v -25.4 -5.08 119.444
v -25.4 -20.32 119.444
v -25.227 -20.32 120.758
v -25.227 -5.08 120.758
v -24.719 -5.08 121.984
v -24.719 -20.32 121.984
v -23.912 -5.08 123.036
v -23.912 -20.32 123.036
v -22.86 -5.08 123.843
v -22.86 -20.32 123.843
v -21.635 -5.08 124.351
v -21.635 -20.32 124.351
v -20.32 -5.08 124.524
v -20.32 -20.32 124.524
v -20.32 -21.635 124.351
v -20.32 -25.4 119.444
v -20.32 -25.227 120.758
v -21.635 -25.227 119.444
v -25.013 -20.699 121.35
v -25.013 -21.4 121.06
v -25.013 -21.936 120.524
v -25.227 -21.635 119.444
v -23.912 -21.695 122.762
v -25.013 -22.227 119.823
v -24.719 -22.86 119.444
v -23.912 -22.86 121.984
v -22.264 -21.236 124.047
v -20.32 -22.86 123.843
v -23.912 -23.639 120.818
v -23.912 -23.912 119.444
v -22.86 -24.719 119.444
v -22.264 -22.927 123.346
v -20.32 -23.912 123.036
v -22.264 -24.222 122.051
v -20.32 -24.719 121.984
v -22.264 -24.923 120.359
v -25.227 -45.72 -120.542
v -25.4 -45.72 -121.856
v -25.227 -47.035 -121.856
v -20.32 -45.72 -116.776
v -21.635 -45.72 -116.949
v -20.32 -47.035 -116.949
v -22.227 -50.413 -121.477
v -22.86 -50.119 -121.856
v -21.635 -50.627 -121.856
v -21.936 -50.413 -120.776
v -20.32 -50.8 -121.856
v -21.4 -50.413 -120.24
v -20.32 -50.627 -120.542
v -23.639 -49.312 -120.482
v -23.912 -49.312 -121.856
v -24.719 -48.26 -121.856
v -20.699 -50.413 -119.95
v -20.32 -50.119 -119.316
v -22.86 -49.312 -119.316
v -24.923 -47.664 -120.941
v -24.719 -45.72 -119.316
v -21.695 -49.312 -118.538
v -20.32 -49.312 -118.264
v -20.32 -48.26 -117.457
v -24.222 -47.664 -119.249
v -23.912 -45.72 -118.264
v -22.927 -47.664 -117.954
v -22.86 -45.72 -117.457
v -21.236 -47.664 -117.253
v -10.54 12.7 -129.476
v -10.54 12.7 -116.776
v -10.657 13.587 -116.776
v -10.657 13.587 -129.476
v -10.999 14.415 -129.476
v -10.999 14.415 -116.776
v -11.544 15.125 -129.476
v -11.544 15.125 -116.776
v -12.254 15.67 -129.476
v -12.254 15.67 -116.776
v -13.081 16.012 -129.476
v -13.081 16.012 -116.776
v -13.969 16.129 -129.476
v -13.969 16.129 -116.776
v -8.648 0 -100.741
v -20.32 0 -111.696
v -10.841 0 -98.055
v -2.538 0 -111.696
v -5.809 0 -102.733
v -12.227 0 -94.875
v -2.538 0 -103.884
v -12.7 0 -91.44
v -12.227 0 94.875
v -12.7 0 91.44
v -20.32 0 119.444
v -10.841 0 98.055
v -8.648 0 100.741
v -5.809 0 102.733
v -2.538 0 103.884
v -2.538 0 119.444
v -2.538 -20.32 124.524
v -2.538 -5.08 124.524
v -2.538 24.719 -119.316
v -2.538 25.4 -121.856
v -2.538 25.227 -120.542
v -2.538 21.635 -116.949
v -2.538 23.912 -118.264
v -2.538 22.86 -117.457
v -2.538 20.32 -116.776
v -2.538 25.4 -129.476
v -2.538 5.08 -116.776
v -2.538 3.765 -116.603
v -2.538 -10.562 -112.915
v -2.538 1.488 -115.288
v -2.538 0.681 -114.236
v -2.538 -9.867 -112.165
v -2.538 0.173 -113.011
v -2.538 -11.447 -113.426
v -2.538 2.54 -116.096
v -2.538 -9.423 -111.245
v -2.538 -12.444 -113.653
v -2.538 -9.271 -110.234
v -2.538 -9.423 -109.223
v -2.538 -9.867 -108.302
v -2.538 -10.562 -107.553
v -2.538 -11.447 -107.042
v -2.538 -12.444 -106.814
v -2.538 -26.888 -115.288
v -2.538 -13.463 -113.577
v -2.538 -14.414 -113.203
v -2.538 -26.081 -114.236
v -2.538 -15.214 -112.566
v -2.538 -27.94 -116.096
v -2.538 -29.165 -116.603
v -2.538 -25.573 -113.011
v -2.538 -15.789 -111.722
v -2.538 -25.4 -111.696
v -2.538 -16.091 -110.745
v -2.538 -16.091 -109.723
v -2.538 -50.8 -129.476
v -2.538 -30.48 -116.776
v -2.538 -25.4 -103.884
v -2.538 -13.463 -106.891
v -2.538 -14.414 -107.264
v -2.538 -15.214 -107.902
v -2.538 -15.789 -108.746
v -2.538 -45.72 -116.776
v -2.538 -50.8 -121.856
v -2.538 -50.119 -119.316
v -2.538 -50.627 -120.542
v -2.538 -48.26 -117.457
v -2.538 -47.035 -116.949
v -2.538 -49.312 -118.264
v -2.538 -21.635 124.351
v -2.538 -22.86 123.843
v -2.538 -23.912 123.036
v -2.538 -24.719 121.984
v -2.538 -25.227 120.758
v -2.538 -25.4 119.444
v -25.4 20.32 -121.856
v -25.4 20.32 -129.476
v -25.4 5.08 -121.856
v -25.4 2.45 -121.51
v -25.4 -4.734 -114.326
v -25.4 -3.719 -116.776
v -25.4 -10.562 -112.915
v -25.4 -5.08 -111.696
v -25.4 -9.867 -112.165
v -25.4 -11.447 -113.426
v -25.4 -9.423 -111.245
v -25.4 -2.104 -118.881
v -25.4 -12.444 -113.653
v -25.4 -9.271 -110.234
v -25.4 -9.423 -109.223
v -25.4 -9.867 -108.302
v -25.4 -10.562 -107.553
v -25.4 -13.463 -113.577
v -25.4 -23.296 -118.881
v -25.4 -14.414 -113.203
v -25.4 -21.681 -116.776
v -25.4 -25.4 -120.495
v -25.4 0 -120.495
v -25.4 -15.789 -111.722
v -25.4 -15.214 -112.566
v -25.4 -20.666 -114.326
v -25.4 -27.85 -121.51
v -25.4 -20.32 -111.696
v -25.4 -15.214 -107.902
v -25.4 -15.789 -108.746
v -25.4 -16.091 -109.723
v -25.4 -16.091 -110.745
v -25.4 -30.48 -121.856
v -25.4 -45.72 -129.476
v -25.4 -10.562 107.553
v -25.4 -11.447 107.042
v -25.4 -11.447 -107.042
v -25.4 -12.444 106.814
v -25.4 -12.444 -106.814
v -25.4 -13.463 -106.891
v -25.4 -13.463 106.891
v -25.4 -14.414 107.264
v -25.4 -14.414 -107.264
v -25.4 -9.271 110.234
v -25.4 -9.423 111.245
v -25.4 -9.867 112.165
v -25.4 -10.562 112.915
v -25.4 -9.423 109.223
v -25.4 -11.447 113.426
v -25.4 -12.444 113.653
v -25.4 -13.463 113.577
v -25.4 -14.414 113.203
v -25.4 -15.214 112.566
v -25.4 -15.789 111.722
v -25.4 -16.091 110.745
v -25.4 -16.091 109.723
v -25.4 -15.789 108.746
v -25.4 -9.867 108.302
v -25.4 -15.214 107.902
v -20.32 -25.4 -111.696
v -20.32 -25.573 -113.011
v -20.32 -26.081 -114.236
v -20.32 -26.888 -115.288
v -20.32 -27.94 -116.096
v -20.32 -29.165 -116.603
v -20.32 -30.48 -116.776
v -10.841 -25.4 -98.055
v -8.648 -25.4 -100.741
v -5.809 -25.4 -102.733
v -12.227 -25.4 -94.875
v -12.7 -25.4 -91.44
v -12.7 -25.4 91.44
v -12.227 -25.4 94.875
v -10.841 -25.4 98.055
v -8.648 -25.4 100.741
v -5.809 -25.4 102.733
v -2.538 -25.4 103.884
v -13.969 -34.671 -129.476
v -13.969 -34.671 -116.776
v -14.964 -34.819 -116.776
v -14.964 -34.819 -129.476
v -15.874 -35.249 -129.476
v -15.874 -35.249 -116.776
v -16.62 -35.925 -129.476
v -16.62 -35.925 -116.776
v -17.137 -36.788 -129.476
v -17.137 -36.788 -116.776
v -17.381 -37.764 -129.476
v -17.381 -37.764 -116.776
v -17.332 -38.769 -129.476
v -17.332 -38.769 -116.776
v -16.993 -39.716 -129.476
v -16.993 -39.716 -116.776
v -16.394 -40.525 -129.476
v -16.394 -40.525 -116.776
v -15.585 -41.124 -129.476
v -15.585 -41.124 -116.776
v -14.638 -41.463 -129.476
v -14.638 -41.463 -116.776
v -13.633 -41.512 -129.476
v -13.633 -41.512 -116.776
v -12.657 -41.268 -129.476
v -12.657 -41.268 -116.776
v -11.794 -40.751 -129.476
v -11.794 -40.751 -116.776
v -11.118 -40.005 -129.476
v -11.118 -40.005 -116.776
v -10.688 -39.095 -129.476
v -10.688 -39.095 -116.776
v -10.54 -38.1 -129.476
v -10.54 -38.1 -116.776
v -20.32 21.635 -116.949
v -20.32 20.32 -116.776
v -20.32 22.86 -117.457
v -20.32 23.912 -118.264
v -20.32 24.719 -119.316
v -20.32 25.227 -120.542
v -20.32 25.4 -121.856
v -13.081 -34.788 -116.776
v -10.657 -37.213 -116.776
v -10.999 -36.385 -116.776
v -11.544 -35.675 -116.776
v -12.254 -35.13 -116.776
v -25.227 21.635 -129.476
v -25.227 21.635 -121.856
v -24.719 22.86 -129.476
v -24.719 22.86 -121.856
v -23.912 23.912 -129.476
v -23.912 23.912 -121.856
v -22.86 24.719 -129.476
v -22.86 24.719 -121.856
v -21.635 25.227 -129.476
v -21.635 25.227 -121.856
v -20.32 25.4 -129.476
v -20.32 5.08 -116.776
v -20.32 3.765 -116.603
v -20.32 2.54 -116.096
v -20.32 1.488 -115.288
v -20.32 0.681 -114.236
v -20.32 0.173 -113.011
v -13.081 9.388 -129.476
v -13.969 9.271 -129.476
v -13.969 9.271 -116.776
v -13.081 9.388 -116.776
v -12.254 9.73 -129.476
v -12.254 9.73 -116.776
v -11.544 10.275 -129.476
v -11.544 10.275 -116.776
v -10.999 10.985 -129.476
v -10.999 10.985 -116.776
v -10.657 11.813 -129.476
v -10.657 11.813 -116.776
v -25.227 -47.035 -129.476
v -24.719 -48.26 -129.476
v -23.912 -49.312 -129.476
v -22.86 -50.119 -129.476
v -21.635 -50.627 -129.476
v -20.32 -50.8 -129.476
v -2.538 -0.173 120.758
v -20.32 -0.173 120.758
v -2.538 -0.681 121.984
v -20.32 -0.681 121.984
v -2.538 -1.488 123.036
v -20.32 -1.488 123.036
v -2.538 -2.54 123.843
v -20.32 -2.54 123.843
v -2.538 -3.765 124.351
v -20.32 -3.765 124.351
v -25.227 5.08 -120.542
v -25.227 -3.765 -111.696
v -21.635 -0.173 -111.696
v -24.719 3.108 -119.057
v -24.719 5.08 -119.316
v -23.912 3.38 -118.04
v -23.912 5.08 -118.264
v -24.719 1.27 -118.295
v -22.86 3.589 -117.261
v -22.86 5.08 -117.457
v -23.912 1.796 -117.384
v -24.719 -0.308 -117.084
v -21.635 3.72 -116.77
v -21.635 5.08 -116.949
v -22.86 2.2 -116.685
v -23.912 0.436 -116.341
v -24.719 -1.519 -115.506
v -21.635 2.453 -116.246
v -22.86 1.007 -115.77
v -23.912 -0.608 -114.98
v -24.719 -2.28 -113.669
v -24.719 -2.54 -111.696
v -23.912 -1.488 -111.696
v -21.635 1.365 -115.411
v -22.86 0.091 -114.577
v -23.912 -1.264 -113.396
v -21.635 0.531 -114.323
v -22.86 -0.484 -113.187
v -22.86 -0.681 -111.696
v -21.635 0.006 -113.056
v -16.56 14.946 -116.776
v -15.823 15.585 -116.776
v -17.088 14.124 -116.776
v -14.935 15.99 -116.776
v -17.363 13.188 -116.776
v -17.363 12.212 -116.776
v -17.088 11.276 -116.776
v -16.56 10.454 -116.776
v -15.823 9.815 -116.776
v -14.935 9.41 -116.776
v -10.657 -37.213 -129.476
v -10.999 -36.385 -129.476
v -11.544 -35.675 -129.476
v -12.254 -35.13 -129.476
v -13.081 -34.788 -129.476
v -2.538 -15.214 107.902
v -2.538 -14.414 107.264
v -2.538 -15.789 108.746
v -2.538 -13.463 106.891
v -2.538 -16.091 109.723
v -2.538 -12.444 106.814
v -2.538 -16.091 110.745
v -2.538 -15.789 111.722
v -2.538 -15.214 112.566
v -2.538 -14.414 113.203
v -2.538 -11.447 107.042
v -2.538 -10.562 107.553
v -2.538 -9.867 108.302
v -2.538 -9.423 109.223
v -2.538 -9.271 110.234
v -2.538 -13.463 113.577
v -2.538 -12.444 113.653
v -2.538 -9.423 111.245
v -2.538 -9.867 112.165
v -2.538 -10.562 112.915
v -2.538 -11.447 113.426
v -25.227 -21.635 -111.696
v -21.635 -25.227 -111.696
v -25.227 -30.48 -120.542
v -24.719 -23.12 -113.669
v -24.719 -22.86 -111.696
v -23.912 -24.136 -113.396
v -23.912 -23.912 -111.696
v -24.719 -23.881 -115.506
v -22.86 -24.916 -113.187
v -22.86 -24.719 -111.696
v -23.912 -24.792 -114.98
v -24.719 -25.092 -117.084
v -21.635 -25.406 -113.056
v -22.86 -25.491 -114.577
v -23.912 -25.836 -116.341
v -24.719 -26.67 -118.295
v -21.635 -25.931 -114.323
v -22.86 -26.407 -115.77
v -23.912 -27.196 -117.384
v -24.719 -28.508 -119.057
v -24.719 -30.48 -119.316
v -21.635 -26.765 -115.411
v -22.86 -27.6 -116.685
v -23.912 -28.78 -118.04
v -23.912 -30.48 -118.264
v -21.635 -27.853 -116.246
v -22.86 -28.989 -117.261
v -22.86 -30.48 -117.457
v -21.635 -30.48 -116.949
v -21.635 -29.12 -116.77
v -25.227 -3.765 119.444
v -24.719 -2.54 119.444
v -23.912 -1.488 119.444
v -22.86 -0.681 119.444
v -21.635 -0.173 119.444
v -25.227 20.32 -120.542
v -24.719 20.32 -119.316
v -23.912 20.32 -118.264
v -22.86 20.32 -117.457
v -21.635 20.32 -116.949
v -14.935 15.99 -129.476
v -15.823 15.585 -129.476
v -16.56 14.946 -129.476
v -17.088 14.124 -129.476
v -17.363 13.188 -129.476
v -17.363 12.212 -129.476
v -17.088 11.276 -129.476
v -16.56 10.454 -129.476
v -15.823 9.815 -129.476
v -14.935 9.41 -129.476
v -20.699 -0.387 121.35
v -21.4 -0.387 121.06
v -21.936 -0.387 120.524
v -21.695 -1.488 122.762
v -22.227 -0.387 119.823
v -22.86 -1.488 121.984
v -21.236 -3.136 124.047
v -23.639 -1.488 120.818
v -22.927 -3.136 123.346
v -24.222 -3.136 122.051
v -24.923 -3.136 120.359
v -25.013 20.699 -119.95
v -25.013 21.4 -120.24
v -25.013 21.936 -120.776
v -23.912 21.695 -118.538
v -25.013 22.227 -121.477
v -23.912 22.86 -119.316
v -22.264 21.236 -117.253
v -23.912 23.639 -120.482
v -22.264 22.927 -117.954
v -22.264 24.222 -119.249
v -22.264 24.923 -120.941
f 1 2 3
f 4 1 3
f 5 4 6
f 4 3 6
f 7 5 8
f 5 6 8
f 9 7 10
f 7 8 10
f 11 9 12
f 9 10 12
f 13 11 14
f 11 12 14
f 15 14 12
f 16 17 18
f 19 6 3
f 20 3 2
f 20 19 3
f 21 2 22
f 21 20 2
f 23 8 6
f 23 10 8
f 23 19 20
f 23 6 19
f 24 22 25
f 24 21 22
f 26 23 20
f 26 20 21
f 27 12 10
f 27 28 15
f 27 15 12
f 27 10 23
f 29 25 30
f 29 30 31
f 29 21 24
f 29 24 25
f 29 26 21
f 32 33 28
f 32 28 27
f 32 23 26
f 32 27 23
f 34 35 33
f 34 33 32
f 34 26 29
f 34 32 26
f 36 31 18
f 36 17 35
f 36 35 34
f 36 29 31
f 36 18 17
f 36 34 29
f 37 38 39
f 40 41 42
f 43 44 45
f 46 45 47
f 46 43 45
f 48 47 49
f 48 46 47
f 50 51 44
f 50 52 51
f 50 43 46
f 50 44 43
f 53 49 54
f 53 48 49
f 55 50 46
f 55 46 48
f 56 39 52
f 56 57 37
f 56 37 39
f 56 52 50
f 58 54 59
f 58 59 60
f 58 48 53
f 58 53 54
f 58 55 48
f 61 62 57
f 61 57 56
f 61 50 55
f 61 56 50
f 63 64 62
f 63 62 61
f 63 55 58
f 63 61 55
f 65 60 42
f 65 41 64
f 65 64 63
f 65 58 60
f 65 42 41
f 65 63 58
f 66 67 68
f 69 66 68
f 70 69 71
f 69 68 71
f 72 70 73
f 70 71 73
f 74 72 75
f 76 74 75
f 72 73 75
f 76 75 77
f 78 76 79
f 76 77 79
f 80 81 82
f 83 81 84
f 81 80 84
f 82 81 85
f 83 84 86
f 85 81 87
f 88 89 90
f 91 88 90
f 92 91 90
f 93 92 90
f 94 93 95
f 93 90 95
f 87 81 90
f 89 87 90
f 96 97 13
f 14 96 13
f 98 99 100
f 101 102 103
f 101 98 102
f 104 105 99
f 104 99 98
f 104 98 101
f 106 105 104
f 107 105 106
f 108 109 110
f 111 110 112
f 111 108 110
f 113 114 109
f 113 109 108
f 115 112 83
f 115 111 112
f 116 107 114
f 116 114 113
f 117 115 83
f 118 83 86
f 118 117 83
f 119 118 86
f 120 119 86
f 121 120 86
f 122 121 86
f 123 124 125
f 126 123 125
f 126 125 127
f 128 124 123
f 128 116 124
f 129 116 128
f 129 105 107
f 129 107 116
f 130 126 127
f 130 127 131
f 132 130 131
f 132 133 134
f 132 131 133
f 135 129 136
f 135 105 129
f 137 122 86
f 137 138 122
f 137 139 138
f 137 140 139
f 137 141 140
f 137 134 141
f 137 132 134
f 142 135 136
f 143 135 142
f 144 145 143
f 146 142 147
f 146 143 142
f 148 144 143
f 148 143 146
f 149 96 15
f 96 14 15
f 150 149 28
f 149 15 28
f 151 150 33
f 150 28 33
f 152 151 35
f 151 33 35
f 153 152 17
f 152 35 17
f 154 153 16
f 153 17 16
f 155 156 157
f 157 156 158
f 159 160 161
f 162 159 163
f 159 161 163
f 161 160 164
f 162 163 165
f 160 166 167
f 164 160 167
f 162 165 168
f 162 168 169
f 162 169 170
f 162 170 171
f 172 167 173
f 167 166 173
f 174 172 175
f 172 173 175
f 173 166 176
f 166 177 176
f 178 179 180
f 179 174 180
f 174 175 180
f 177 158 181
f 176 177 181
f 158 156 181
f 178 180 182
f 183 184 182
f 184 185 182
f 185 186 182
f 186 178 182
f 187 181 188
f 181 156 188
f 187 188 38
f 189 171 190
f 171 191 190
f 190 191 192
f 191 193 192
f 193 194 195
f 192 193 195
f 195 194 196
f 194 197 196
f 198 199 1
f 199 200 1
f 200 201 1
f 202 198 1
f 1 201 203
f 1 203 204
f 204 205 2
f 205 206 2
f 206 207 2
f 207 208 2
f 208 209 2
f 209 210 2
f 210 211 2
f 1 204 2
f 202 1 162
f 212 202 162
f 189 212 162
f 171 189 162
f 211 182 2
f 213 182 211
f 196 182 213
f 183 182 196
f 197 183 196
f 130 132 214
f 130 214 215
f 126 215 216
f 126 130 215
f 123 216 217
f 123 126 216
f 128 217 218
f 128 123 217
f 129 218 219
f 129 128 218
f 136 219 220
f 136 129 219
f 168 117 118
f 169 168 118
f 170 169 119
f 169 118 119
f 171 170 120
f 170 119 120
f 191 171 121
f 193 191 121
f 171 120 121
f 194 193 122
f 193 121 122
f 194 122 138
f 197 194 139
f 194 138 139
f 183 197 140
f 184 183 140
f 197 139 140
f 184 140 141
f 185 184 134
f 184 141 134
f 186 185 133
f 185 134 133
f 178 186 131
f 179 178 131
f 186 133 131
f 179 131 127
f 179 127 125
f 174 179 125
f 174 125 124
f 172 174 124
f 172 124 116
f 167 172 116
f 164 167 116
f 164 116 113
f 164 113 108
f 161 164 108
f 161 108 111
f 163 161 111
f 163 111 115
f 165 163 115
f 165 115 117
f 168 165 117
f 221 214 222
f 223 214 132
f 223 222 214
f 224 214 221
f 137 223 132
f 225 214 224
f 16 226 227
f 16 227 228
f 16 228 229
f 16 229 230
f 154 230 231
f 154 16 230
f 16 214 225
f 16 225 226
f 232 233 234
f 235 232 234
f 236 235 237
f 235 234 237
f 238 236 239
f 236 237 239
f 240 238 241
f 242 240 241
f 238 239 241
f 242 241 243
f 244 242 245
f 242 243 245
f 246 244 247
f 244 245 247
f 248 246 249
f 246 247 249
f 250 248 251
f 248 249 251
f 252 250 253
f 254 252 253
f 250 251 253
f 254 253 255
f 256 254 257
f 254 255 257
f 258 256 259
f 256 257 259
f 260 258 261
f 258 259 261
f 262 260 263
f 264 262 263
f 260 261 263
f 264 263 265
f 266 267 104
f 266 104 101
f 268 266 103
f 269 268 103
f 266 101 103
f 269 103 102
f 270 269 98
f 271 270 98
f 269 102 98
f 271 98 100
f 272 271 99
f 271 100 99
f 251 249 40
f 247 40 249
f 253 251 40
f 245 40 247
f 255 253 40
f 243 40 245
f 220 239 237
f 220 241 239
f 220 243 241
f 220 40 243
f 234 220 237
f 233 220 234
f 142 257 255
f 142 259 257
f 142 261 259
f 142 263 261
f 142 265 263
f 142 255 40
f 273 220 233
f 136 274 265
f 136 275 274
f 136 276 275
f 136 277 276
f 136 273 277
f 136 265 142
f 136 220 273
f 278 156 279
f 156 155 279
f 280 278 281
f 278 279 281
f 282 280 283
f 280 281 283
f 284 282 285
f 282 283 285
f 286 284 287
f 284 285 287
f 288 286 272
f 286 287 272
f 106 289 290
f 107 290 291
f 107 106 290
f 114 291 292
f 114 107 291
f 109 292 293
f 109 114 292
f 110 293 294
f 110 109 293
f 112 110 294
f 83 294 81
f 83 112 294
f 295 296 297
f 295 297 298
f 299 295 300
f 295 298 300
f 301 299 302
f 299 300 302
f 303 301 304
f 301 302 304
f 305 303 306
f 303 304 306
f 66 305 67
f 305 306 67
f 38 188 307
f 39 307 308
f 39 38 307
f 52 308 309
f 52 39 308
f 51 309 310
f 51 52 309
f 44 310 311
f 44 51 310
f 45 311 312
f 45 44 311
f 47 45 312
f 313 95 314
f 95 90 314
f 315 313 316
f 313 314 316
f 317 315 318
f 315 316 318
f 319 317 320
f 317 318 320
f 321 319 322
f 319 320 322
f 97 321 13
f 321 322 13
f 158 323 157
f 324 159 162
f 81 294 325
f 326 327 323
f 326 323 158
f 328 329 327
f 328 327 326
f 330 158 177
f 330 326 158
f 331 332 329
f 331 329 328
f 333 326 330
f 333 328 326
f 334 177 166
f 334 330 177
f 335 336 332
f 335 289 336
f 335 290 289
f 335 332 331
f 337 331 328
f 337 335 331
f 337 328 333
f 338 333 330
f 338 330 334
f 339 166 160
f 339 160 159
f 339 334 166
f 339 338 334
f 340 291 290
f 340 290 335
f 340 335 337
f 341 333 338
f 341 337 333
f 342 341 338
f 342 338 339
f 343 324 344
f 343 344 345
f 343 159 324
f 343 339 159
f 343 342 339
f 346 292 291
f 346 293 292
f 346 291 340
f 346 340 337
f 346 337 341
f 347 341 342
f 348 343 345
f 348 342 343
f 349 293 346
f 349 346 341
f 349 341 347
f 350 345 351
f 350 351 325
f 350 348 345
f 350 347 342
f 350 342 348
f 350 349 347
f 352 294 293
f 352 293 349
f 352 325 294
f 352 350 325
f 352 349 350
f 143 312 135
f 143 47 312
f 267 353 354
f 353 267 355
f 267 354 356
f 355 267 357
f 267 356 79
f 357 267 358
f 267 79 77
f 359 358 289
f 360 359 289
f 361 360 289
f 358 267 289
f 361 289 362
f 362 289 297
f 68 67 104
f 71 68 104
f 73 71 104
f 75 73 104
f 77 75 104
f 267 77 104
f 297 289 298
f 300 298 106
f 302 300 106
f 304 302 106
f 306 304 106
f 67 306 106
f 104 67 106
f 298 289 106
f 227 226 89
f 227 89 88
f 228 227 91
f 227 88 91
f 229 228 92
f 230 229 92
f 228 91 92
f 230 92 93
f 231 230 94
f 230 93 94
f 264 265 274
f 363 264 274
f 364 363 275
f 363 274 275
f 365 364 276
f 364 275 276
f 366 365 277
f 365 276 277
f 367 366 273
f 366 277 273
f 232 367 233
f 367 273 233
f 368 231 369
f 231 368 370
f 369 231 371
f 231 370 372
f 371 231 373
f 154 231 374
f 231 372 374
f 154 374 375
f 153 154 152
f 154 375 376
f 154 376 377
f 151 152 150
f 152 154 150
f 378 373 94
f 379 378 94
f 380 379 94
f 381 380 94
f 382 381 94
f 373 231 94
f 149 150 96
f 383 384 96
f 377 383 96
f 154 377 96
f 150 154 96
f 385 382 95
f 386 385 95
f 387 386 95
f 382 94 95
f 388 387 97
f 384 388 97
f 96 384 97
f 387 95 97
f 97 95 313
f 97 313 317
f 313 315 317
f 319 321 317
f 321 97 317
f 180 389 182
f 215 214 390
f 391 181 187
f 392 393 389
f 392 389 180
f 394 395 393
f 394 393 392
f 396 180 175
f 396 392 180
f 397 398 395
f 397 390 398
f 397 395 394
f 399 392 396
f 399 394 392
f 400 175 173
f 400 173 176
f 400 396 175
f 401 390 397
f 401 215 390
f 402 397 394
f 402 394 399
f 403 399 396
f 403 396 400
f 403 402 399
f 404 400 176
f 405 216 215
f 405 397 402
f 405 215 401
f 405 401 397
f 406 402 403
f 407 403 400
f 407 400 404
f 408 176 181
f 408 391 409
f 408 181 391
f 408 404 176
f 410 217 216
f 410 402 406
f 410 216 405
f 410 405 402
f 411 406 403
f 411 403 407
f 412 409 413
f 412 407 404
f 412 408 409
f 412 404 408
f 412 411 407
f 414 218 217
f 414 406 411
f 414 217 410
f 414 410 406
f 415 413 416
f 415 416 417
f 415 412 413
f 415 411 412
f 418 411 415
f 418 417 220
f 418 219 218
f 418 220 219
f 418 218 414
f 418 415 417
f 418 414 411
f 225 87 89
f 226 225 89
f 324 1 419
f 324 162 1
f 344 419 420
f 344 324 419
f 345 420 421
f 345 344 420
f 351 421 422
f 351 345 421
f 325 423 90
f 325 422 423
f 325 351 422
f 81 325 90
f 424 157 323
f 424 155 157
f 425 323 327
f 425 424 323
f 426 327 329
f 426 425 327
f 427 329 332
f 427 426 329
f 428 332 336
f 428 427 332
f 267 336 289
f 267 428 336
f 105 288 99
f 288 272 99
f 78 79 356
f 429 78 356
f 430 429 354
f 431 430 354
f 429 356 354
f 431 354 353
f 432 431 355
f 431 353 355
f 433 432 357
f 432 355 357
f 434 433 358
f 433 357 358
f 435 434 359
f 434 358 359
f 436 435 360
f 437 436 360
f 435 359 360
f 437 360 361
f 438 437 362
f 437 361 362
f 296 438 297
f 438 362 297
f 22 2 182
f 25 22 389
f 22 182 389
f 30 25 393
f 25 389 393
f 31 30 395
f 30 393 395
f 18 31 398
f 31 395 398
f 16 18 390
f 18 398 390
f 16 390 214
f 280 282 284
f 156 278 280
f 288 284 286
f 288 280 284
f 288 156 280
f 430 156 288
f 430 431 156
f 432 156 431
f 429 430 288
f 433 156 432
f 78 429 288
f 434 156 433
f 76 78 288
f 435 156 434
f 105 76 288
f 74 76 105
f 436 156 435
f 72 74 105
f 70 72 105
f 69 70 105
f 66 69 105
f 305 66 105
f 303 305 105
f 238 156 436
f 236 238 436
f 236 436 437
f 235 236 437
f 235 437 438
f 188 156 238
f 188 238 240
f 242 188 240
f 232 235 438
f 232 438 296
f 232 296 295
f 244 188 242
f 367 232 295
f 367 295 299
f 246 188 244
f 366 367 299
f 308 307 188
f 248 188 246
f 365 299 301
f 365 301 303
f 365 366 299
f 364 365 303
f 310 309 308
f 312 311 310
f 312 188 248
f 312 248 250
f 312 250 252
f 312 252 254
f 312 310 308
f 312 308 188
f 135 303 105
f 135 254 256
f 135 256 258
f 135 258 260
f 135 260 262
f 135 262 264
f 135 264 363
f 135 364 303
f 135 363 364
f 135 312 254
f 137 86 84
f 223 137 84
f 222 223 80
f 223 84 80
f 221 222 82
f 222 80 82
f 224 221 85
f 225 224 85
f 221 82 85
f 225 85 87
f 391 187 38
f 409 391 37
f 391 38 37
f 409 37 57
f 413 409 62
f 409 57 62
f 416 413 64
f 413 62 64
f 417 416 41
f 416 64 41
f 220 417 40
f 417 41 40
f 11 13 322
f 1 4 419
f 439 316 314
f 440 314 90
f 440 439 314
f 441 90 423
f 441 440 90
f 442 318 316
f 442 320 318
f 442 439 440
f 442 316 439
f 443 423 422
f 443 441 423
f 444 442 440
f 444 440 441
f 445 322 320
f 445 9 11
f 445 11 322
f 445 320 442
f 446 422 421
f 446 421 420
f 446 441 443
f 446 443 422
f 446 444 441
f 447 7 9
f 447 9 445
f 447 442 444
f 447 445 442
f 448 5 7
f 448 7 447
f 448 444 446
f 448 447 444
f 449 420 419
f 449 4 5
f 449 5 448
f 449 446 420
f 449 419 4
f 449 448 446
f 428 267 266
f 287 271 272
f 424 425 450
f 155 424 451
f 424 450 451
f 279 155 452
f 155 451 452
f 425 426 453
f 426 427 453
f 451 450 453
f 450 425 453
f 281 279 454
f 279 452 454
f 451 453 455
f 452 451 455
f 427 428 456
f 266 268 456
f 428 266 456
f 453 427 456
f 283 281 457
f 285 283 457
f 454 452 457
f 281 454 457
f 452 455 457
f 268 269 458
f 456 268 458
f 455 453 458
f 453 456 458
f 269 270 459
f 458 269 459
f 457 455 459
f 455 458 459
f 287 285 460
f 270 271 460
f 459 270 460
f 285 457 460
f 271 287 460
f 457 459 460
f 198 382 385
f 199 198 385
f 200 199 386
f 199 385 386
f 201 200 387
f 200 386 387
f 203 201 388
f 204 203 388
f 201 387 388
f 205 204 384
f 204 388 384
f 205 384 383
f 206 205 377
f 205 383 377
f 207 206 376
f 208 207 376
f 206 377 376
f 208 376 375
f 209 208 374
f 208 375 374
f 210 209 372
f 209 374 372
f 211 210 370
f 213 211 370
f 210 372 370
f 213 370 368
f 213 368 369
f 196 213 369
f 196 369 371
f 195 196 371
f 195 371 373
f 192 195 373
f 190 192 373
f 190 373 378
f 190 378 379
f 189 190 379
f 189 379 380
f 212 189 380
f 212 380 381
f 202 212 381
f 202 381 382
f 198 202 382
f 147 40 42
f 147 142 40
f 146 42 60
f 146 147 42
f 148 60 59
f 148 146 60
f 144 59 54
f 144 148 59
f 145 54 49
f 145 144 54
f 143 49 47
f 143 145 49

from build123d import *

# Parameters (mm, degrees)
F1_DEPTH = 25.4
F2_R     = 3.429
F3_DEPTH = 147.32
F4_W     = 22.8622798618
F4_H     = 12.7
F5_DEPTH = 25.4
F6_DEPTH = 76.2
F8_DEPTH = 25.4
F9_R     = 5.08


with BuildPart() as f1:
    # F0 (on Front) → F1 (new body)
    with BuildSketch(Plane.XZ):
        with BuildLine():
            Line((-25.4, 124.5236706513), (-25.4, 91.1413904513))
            Line((-25.4, 91.1413904513), (-25.4, -91.1413904513))
            Line((-25.4, -91.1413904513), (-25.4, -91.4211095487))
            Line((-25.4, -91.4211095487), (-25.4, -129.4763404513))
            Line((-25.4, -129.4763404513), (-2.5377201382, -129.4763404513))
            Line((-2.5377201382, -129.4763404513), (-2.5377201382, -103.8838730506))
            ThreePointArc((-2.5377201382, -103.8838730506), (-9.8366418496, -99.4730864008), (-12.7, -91.44))
            Line((-12.7, -91.44), (-12.7, 91.44))
            ThreePointArc((-12.7, 91.44), (-9.8366418496, 99.4730864008), (-2.5377201382, 103.8838730506))
            Line((-2.5377201382, 103.8838730506), (-2.5377201382, 124.5236706513))
            Line((-2.5377201382, 124.5236706513), (-25.4, 124.5236706513))
        make_face()
    extrude(amount=F1_DEPTH)

    # F2 (on face) → F3 (cut)
    with BuildSketch(Plane.YZ.offset(-2.5377201382)):
        with Locations((-12.7, -110.2338730506)):
            Circle(F2_R)
        with Locations((-12.7, 110.2338730506)):
            Circle(F2_R)
    extrude(amount=-F3_DEPTH, mode=Mode.SUBTRACT)

    # F4 (on face) → F5 (join)
    with BuildSketch(Plane.XZ.offset(25.4)):
        with Locations((-13.9688600691, -123.1263404513)):
            Rectangle(F4_W, F4_H)
    extrude(amount=F5_DEPTH)

    # F6 (add): a face of the model
    f6_faces = [f1.faces().sort_by_distance(p)[0] for p in [
        (-13.9688600691, -50.8, -123.1263404513),
    ]]
    extrude(f6_faces, amount=-F6_DEPTH)

    # F7 (on face) → F8 (cut)
    with BuildSketch(Plane.XY.offset(-116.7763404513)):
        with BuildLine():
            Line((-13.9688600691, 9.271), (-13.9688600691, 16.129))
            ThreePointArc((-13.9688600691, 16.129), (-17.3978600691, 12.7), (-13.9688600691, 9.271))
        make_face()
        with BuildLine():
            ThreePointArc((-10.5398600691, -38.1), (-11.5441909164, -35.6753308473), (-13.9688600691, -34.671))
            ThreePointArc((-13.9688600691, -34.671), (-16.3935292218, -40.5246691527), (-10.5398600691, -38.1))
        make_face()
        with BuildLine():
            ThreePointArc((-13.9688600691, 9.271), (-11.5441909164, 10.2753308473), (-10.5398600691, 12.7))
            ThreePointArc((-10.5398600691, 12.7), (-11.5441909164, 15.1246691527), (-13.9688600691, 16.129))
            Line((-13.9688600691, 16.129), (-13.9688600691, 9.271))
        make_face()
    extrude(amount=-F8_DEPTH, mode=Mode.SUBTRACT)

    # F9
    f9_edges = [f1.edges().sort_by_distance(p)[0] for p in [
        (-13.96886, -25.4, 124.523671),
        (-25.4, -12.7, 124.523671),
        (-13.96886, 0, 124.523671),
        (-25.4, -25.4, 3.873665),
        (-25.4, 0, 3.873665),
        (-13.96886, 0, -116.77634),
        (-13.96886, 25.4, -116.77634),
        (-25.4, -38.1, -116.77634),
        (-25.4, 12.7, -116.77634),
        (-25.4, 25.4, -123.12634),
        (-13.96886, -25.4, -116.77634),
        (-25.4, -50.8, -123.12634),
        (-13.96886, -50.8, -116.77634),
    ]]
    fillet(f9_edges, radius=F9_R)


solid = f1.part
